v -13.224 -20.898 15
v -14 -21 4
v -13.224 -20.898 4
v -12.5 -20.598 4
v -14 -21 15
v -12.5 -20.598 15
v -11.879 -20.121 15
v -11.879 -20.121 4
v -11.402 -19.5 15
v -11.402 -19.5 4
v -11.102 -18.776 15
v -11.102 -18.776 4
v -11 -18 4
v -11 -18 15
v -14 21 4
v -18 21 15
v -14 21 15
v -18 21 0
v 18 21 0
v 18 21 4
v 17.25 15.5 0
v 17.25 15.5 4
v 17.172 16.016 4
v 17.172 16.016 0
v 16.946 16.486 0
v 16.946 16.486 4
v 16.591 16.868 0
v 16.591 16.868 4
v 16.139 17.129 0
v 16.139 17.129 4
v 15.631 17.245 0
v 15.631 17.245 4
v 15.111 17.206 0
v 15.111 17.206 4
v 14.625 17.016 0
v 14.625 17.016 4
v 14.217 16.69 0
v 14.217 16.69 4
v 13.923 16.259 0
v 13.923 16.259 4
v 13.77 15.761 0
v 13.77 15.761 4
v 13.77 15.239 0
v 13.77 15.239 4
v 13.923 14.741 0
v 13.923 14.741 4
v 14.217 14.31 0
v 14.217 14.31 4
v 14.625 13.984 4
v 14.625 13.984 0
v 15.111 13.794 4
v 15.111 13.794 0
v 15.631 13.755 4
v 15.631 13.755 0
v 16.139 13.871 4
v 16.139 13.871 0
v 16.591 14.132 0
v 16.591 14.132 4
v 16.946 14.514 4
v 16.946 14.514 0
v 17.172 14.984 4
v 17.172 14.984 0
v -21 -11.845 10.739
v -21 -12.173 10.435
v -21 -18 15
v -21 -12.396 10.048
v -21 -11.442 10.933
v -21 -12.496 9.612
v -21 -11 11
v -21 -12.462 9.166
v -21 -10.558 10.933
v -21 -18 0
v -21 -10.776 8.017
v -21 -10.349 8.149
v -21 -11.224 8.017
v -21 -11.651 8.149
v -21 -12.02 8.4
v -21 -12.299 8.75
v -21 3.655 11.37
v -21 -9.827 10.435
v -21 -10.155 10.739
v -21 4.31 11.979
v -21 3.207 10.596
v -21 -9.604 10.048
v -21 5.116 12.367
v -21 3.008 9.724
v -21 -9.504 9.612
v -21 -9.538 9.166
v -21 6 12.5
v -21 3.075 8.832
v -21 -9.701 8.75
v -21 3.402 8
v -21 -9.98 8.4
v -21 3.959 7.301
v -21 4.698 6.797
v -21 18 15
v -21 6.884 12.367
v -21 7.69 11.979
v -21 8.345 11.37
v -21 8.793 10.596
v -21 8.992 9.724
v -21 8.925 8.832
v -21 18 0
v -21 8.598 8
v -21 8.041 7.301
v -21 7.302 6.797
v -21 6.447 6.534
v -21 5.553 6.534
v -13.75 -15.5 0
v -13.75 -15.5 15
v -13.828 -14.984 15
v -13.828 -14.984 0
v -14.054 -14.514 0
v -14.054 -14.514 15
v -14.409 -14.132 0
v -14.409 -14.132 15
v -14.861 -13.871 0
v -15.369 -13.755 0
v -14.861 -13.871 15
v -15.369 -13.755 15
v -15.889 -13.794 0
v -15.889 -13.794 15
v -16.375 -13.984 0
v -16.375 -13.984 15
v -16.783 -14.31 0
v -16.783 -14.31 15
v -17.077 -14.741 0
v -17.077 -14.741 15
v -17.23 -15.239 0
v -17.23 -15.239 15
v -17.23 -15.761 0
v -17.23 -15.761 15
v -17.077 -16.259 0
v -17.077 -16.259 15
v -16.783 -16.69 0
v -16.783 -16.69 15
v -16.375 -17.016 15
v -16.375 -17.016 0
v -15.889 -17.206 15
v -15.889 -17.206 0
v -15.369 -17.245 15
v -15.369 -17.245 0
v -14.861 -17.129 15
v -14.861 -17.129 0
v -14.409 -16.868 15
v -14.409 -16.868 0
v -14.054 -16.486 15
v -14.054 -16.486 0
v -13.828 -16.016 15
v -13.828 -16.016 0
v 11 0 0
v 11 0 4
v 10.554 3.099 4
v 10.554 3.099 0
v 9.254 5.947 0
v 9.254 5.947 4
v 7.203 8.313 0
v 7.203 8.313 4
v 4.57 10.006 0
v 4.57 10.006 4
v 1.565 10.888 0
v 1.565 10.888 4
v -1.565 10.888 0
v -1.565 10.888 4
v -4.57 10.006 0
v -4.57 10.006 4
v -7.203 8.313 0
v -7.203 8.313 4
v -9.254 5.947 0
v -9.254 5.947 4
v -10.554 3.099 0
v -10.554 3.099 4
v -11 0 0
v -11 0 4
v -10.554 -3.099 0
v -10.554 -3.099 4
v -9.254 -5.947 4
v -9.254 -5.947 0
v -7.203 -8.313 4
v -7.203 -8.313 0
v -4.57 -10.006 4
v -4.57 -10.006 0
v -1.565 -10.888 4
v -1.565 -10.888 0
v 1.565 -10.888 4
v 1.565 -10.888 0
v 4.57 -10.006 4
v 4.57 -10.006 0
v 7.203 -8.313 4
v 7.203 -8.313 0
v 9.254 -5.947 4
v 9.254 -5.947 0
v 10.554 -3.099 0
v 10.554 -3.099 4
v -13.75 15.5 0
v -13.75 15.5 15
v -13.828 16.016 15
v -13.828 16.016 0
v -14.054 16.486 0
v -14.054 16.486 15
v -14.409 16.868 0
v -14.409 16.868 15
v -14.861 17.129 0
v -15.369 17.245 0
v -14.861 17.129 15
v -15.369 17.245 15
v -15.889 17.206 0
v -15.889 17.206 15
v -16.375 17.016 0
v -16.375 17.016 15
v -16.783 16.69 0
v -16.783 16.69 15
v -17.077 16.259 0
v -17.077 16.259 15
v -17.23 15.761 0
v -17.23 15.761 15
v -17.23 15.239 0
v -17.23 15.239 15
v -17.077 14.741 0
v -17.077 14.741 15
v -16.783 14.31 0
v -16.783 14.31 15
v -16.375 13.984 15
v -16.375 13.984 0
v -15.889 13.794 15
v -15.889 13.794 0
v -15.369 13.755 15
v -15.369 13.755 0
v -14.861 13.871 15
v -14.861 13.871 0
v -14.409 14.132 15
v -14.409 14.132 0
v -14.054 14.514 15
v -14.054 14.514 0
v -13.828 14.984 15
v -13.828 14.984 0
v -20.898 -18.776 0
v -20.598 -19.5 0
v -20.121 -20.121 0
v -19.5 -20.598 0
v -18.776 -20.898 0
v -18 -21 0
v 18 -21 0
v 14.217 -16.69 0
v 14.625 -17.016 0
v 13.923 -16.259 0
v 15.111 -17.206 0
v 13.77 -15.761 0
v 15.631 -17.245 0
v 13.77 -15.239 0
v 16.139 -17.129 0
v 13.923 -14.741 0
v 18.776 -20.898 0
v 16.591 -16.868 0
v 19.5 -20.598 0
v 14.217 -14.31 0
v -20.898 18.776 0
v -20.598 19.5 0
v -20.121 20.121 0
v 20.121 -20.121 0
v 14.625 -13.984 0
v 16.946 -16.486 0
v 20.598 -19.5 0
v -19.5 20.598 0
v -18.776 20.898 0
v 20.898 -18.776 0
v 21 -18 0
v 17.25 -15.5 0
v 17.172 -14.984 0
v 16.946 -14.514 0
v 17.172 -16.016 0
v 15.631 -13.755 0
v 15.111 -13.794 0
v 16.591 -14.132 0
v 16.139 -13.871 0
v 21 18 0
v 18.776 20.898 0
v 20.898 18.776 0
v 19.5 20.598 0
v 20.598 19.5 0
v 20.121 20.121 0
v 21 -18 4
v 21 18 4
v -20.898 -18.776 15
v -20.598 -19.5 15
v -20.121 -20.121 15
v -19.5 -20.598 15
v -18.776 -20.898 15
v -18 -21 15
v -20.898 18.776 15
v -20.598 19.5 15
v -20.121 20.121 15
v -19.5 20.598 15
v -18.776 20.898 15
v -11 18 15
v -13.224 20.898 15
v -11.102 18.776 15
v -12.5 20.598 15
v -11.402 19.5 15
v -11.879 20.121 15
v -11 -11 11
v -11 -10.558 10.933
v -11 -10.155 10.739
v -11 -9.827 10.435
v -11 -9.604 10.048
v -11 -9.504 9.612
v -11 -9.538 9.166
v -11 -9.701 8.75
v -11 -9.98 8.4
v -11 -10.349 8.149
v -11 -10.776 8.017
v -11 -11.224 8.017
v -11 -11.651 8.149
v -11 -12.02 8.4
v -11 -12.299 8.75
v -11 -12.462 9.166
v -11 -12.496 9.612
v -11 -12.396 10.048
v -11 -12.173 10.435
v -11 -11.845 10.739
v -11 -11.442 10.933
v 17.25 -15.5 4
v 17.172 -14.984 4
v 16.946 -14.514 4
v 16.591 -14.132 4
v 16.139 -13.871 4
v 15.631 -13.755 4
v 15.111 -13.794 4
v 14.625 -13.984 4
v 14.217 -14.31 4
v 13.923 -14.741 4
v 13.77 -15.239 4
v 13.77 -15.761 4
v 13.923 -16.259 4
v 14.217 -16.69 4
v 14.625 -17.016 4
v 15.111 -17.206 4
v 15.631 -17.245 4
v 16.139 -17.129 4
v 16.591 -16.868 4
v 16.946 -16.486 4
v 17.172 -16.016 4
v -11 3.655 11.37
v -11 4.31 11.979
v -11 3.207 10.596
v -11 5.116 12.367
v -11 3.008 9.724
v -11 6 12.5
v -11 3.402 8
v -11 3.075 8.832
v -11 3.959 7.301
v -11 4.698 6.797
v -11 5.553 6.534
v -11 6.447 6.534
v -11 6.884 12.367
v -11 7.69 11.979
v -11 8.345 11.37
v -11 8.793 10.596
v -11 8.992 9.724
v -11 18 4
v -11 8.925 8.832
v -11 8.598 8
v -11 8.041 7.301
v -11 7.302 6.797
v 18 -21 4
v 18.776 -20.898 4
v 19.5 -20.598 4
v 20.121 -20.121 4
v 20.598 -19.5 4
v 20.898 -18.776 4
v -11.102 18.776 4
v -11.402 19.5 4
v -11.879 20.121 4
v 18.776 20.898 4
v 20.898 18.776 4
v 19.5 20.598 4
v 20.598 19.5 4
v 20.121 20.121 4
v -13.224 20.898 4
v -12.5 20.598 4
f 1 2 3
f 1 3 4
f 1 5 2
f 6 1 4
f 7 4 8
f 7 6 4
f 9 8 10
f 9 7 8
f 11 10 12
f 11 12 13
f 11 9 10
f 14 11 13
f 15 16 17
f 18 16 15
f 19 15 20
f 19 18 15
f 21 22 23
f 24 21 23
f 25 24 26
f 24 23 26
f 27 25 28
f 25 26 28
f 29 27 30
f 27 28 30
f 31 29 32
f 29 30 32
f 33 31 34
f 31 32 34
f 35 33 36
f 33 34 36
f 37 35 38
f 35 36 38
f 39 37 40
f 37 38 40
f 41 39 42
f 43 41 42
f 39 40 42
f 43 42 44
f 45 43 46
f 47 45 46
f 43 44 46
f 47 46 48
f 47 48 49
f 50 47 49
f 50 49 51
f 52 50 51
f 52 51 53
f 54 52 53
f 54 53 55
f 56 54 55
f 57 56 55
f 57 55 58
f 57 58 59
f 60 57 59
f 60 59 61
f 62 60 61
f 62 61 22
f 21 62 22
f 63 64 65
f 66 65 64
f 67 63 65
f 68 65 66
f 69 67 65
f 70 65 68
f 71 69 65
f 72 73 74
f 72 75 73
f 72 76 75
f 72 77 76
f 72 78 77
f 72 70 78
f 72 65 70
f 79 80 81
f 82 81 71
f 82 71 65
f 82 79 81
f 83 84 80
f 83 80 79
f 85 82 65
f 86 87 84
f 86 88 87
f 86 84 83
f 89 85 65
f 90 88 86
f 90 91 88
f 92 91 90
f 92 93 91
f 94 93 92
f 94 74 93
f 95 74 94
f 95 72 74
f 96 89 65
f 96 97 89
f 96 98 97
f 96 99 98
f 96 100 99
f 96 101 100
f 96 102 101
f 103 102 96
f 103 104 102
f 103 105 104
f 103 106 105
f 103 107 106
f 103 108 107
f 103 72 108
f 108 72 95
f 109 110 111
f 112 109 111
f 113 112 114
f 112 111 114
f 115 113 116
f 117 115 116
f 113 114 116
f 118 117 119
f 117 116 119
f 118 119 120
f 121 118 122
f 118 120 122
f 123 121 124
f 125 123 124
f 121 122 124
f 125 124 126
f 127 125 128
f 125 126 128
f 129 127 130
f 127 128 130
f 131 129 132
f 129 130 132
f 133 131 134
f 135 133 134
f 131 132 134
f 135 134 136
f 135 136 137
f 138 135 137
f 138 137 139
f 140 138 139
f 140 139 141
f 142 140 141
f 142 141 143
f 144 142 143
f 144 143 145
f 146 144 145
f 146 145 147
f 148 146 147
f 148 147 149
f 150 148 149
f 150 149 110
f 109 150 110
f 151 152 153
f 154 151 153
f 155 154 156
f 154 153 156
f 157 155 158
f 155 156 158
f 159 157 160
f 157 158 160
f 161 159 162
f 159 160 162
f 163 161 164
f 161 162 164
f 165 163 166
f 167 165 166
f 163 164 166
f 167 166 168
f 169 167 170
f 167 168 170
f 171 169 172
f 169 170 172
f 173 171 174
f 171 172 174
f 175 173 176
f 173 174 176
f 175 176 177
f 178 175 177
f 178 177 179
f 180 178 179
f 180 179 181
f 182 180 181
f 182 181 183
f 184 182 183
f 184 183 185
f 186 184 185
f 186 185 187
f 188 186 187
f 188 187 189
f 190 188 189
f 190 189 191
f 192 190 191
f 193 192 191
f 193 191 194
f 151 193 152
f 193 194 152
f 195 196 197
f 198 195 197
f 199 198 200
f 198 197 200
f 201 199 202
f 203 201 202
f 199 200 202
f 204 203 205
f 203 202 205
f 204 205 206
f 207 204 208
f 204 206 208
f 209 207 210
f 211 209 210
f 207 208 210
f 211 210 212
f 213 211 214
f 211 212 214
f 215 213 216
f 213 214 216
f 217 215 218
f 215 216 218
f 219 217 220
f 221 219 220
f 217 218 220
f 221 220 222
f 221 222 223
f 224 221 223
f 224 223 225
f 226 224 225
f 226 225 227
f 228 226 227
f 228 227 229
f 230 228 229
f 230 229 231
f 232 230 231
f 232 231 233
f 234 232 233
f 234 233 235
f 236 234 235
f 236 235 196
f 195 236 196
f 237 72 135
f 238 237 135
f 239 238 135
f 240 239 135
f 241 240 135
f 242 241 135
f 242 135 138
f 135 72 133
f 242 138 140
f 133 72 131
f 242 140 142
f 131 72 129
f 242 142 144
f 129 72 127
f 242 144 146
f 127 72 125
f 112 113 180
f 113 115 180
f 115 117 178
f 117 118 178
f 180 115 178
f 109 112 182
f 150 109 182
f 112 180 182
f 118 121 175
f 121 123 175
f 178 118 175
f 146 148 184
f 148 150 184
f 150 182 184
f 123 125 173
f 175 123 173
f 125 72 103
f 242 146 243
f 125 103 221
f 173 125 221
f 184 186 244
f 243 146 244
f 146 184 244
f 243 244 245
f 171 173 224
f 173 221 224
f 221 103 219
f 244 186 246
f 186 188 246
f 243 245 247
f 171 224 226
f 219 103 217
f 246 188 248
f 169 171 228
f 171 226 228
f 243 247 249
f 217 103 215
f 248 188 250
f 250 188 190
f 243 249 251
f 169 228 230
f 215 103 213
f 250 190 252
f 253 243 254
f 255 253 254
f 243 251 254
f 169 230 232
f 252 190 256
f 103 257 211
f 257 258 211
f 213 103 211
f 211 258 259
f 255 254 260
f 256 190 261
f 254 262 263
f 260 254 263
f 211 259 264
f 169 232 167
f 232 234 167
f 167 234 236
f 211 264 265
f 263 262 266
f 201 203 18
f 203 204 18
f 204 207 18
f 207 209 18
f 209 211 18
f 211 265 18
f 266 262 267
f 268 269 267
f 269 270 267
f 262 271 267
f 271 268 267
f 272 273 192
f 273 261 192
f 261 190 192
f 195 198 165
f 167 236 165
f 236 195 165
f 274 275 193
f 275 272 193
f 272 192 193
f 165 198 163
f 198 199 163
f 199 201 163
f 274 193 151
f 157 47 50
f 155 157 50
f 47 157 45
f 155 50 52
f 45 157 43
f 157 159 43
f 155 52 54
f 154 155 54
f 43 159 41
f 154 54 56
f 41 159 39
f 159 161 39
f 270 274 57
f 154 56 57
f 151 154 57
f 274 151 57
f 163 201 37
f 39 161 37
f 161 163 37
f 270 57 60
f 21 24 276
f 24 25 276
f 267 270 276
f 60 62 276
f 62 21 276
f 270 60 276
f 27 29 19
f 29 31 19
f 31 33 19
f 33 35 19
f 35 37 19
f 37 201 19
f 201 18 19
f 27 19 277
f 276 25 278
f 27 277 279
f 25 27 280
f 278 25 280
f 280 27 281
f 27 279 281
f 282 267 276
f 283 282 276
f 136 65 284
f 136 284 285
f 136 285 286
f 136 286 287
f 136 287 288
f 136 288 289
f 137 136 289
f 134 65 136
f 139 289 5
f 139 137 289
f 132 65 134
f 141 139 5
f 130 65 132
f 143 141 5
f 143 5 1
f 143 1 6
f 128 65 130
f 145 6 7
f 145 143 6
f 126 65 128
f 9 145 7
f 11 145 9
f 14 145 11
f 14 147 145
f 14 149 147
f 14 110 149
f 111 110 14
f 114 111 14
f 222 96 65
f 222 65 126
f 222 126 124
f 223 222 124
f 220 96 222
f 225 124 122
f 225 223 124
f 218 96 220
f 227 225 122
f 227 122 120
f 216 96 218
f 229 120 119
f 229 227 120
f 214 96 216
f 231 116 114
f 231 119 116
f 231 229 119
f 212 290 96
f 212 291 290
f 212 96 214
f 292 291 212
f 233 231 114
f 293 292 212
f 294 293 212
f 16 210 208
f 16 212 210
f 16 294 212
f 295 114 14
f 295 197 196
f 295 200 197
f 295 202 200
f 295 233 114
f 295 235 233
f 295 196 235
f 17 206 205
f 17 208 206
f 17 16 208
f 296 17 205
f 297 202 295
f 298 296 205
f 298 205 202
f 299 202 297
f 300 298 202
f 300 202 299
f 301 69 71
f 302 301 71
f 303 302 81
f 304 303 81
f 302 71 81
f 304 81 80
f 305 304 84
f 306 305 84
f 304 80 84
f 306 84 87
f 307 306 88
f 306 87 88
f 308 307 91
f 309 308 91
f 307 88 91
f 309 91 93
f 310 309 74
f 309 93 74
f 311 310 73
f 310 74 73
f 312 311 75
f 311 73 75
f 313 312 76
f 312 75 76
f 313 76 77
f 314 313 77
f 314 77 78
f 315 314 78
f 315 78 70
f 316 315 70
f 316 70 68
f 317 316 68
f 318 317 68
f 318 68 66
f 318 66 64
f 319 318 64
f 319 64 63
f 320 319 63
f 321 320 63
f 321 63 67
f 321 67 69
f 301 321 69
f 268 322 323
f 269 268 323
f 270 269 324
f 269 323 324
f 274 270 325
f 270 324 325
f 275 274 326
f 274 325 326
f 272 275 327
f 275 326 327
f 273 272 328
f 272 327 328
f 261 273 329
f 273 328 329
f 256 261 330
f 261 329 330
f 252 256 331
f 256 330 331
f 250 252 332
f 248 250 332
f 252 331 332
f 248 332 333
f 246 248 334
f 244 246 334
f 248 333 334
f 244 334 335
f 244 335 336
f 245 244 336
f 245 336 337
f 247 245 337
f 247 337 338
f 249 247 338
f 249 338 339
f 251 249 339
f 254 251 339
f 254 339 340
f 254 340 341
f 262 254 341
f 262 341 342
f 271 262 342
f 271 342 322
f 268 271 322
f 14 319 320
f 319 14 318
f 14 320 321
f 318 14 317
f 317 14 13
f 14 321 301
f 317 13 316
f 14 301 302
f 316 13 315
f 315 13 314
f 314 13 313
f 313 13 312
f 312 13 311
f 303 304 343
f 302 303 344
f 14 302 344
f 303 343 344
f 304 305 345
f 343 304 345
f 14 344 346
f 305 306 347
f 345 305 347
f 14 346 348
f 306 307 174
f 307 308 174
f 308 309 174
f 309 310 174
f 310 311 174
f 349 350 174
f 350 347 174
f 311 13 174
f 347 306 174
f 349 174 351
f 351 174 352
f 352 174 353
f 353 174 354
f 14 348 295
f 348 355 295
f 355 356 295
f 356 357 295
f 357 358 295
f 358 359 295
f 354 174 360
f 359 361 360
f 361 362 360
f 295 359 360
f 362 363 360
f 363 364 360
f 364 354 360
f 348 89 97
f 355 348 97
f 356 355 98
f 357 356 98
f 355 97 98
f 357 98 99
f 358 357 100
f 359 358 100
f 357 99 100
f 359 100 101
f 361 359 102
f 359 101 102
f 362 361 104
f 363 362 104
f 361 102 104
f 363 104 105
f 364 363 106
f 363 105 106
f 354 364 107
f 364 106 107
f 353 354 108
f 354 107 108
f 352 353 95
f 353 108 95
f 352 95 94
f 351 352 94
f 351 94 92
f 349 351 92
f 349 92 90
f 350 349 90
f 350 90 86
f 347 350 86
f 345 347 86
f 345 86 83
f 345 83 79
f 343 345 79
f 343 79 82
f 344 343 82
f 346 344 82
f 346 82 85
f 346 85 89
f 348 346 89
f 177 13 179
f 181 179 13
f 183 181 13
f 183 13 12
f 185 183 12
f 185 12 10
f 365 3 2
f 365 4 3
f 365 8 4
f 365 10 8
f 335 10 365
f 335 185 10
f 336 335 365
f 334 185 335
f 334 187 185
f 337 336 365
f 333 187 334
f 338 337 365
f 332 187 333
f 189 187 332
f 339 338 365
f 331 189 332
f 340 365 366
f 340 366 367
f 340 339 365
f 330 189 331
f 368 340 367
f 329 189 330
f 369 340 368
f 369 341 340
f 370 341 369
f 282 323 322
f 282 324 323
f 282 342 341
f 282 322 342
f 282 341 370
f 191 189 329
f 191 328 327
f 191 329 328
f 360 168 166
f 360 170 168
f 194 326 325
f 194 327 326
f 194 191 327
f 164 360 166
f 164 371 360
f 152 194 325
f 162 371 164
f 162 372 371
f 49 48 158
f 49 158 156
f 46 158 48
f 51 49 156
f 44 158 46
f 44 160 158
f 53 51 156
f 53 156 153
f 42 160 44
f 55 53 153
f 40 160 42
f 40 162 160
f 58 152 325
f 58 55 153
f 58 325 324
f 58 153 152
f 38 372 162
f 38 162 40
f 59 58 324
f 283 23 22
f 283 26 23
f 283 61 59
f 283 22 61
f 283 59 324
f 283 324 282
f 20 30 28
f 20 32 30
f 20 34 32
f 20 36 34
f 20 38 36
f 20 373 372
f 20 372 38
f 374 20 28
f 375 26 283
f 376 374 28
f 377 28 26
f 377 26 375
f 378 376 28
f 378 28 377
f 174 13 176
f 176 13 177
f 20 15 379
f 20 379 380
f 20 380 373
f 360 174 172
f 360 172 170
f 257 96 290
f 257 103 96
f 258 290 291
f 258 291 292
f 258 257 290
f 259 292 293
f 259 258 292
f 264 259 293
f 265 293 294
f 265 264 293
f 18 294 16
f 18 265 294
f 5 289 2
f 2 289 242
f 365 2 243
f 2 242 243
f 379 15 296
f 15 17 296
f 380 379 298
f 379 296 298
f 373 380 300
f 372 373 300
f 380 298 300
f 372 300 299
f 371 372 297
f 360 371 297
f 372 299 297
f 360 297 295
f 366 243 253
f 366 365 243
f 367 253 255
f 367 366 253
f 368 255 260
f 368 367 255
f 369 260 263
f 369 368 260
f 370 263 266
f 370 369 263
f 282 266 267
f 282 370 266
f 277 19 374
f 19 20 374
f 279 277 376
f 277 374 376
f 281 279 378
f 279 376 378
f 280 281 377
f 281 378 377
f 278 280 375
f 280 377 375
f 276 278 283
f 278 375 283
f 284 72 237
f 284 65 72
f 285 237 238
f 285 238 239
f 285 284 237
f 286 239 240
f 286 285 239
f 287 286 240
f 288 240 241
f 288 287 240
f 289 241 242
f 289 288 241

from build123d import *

# Parameters (mm, degrees)
SKETCH1_W           = 42
SKETCH1_H           = 42
BOSS_EXTRUDE1_DEPTH = 4
SKETCH2_W           = 10
SKETCH2_H           = 42
BOSS_EXTRUDE2_DEPTH = 11
SKETCH3_R           = 11
CUT_EXTRUDE1_DEPTH  = 11
FILLET1_R           = 3
SKETCH4_R           = 1.75
CUT_EXTRUDE2_DEPTH  = 21
SKETCH6_R           = 3
SKETCH6_R_2         = 1.5
CUT_EXTRUDE3_DEPTH  = 21


with BuildPart() as part:
    # Sketch1 → Boss-Extrude1 (new body)
    with BuildSketch(Plane.XY):
        Rectangle(SKETCH1_W, SKETCH1_H)
    extrude(amount=BOSS_EXTRUDE1_DEPTH)

    # Sketch2 → Boss-Extrude2 (add)
    with BuildSketch(Plane.XY.offset(4)):
        with Locations((-16, 0)):
            Rectangle(SKETCH2_W, SKETCH2_H)
    extrude(amount=BOSS_EXTRUDE2_DEPTH)

    # Sketch3 → Cut-Extrude1 (cut)
    with BuildSketch(Plane.XY.offset(4)):
        Circle(SKETCH3_R)
    extrude(amount=-CUT_EXTRUDE1_DEPTH, mode=Mode.SUBTRACT)

    # Fillet1
    fillet1_edges = [part.edges().sort_by_distance(p)[0] for p in [
        (-11, -21, 9.5),
        (-11, 21, 9.5),
        (21, -21, 2),
        (-21, -21, 7.5),
        (-21, 21, 7.5),
        (21, 21, 2),
    ]]
    fillet(fillet1_edges, radius=FILLET1_R)

    # Sketch4 → Cut-Extrude2 (cut)
    with BuildSketch(Plane.XY.offset(15)):
        with Locations((-15.5, 15.5)):
            Circle(SKETCH4_R)
        with Locations((-15.5, -15.5)):
            Circle(SKETCH4_R)
        with Locations((15.5, 15.5)):
            Circle(SKETCH4_R)
        with Locations((15.5, -15.5)):
            Circle(SKETCH4_R)
    extrude(amount=-CUT_EXTRUDE2_DEPTH, mode=Mode.SUBTRACT)

    # Sketch6 → Cut-Extrude3 (cut)
    with BuildSketch(Plane.ZY.offset(21)):
        with Locations((9.5, 6)):
            Circle(SKETCH6_R)
        with Locations((9.5, -11)):
            Circle(SKETCH6_R_2)
    extrude(amount=-CUT_EXTRUDE3_DEPTH, mode=Mode.SUBTRACT)


solid = part.part
